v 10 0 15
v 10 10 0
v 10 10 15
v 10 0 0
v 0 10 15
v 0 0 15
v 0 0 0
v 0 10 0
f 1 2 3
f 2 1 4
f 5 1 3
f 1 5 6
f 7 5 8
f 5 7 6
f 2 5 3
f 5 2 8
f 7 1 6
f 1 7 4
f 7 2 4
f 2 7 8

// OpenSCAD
module StraightSupport(height=1,cut=true){
	translate([0,0,-height])
	linear_extrude(height = height, center = false, convexity = 10)
		projection(cut = cut){
			union(){
				for (i = [0 : $children-1])
					child(i);
			 }
	}
}


	translate([0,0,10]){
		#cube([10,10,5]);
		StraightSupport(10){
			cube([10,10,5]);
		}
	}
